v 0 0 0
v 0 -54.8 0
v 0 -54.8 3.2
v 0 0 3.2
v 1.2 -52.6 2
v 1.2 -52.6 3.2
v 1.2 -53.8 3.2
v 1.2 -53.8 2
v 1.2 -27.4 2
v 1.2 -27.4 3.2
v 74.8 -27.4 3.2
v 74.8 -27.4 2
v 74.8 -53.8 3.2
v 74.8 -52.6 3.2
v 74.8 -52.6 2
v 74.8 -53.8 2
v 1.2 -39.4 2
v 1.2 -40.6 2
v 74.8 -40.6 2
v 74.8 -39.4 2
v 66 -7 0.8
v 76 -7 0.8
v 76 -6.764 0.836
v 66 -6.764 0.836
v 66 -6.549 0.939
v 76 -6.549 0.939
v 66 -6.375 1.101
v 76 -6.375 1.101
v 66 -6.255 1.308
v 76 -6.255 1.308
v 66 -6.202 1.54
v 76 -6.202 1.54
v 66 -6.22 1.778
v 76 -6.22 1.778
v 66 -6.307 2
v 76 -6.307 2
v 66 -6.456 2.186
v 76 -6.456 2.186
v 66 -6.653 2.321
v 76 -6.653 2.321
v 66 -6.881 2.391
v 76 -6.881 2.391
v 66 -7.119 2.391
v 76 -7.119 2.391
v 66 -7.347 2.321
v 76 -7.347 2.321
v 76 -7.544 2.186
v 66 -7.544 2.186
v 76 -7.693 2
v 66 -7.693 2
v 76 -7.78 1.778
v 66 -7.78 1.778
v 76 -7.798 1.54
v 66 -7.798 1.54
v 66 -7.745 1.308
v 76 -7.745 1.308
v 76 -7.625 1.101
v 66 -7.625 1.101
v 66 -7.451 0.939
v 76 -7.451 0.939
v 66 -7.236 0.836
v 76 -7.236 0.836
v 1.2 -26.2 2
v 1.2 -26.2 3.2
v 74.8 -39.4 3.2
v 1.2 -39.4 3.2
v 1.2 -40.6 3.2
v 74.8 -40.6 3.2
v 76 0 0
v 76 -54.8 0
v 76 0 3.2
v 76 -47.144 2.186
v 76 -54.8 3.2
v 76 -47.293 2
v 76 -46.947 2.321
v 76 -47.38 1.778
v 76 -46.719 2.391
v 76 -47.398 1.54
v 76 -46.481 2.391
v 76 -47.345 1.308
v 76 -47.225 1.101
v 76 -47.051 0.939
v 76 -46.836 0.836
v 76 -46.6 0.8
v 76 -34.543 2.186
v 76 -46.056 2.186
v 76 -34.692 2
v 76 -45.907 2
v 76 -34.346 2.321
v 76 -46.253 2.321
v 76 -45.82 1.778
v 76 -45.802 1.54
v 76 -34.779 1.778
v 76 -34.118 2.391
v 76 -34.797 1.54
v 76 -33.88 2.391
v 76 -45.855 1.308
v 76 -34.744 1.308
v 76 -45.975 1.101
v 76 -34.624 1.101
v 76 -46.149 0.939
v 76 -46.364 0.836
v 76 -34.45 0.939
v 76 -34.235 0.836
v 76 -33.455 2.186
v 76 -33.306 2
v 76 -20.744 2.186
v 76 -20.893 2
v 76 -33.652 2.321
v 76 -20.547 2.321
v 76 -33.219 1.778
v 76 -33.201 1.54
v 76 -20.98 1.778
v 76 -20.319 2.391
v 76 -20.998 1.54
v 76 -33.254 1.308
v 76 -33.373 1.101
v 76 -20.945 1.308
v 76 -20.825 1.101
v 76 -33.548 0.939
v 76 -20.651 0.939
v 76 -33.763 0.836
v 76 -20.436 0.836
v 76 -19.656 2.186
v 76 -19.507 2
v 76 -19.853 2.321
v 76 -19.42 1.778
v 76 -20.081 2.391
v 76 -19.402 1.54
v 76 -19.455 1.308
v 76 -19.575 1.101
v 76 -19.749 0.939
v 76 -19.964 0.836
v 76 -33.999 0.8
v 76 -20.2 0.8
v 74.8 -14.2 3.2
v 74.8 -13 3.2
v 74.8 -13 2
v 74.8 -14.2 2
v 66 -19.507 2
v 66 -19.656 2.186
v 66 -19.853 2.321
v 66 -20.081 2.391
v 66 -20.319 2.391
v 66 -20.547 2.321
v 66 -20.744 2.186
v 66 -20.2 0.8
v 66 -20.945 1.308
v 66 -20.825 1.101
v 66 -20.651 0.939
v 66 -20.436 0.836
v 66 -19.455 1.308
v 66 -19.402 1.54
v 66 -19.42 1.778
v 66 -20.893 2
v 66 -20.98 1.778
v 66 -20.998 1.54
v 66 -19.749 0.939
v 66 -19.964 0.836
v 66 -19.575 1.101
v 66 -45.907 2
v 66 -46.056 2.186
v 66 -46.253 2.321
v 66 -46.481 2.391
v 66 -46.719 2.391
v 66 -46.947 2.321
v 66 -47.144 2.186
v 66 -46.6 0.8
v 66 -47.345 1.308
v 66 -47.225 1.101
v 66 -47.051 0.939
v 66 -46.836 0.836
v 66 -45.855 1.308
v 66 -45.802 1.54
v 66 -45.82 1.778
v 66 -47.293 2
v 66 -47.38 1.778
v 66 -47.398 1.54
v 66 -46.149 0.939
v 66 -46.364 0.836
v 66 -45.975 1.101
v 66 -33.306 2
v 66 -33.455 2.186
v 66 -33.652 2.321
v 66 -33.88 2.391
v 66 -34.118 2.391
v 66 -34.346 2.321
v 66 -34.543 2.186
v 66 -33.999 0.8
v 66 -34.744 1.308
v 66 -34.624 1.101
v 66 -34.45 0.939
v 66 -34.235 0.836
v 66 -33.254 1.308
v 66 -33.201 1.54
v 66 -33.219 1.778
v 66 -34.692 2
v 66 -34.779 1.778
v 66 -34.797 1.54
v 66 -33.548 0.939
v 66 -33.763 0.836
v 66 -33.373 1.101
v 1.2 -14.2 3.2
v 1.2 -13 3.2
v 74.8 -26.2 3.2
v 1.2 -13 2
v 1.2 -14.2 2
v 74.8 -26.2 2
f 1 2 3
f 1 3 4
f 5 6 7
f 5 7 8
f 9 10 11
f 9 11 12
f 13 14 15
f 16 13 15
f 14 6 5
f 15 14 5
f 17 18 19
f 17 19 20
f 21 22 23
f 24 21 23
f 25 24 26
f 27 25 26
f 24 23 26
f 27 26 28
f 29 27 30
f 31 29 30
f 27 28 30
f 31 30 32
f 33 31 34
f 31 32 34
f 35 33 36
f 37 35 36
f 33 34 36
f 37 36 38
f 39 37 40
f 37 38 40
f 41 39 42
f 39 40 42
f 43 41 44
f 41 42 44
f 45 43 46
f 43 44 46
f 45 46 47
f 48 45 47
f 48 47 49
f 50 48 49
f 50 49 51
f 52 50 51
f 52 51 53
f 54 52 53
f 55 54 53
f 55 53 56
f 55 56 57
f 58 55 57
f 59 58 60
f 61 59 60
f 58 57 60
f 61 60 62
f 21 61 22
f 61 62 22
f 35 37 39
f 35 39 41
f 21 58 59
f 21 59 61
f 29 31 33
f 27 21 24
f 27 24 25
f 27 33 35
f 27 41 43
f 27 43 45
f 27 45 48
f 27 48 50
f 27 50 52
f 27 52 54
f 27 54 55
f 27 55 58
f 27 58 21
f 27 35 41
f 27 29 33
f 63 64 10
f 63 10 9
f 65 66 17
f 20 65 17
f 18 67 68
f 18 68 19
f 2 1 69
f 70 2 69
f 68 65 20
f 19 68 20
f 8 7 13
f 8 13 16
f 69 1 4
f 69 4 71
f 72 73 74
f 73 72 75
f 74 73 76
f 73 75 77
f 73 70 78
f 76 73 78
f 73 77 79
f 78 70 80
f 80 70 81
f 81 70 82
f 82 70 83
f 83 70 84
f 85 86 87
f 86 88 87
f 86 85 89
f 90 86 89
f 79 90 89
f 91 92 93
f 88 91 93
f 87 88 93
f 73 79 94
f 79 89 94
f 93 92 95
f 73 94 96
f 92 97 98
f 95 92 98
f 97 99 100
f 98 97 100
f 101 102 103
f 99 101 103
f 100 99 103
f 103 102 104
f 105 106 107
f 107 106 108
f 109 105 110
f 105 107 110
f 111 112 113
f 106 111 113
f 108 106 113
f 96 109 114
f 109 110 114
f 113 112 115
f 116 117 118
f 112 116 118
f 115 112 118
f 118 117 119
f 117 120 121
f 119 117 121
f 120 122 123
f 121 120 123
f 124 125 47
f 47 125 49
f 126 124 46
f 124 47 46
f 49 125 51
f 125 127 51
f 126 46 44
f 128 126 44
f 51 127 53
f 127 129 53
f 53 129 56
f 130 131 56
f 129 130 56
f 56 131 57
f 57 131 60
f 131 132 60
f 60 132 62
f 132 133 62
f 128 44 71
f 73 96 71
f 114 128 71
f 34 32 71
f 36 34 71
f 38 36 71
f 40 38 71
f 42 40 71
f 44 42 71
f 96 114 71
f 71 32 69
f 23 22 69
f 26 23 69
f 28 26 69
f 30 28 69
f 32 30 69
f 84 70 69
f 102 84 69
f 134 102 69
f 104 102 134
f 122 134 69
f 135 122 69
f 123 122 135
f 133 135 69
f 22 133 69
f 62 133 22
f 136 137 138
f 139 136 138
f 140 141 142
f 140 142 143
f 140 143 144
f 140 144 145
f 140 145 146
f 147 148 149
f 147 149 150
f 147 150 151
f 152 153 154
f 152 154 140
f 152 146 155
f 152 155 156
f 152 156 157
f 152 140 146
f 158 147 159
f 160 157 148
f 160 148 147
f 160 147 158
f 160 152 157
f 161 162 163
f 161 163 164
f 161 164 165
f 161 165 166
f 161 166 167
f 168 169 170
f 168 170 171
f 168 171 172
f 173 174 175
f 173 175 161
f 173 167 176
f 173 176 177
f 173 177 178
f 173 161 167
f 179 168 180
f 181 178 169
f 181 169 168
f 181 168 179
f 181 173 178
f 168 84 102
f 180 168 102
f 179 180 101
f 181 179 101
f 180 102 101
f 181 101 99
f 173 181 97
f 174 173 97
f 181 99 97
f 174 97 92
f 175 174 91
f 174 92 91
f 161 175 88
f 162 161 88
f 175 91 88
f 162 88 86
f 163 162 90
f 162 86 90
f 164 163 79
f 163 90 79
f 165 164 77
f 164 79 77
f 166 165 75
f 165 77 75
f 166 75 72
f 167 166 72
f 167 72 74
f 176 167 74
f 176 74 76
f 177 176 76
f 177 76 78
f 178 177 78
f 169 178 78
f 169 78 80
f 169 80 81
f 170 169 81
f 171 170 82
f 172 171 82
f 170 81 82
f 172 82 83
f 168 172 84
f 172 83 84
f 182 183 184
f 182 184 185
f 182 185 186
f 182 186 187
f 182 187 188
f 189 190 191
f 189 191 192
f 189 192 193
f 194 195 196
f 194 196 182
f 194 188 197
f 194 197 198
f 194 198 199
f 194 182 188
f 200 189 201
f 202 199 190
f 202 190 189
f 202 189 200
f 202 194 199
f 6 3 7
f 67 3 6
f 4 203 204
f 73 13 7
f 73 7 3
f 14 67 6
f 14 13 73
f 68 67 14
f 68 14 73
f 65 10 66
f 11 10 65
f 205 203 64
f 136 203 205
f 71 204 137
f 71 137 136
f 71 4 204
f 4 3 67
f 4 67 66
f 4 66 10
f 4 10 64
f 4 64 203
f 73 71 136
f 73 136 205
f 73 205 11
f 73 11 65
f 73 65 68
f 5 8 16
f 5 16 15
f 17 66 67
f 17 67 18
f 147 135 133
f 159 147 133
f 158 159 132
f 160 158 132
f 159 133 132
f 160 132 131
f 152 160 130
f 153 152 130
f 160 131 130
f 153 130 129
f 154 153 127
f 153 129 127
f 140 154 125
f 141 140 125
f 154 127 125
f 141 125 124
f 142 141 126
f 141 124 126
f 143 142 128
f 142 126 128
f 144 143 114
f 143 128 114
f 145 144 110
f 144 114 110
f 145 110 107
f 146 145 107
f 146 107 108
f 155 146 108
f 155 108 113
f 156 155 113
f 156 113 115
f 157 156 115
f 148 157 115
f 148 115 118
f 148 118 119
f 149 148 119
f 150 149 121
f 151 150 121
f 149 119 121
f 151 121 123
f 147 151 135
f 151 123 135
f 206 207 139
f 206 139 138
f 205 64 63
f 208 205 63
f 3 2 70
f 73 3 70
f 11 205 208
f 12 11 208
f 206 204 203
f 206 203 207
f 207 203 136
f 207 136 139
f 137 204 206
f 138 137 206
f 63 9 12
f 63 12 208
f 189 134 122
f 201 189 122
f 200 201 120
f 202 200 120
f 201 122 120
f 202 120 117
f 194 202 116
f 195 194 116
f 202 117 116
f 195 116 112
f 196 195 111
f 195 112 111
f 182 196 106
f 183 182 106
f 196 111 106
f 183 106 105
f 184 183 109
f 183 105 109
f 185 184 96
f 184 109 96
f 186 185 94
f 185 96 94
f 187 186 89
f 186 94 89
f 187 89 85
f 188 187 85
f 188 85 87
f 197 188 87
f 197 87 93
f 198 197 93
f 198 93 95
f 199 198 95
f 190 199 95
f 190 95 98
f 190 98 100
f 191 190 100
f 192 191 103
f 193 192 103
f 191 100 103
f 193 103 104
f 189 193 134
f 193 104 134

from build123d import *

# Parameters (mm, degrees)
SKETCH1_W           = 76
SKETCH1_H           = 54.8
BOSS_EXTRUDE1_DEPTH = 3.2
CUT_EXTRUDE1_START  = 1.2
SKETCH2_W           = 1.2
SKETCH2_H           = 1.2
CUT_EXTRUDE1_DEPTH  = 73.6
CUT_EXTRUDE2_START  = 76
SKETCH3_R           = 0.8
CUT_EXTRUDE2_DEPTH  = 10


with BuildPart() as part:
    # Sketch1 → Boss-Extrude1 (new body)
    with BuildSketch(Plane.XY):
        with Locations((38, -27.4)):
            Rectangle(SKETCH1_W, SKETCH1_H)
    extrude(amount=BOSS_EXTRUDE1_DEPTH)

    # Sketch2 → Cut-Extrude1 (cut)
    with BuildSketch(Plane(origin=(0, 0, 0), x_dir=(0, 0, -1), z_dir=(1, 0, 0)).offset(CUT_EXTRUDE1_START)):
        with Locations((-2.6, -13.6)):
            Rectangle(SKETCH2_W, SKETCH2_H)
        with Locations((-2.6, -26.8)):
            Rectangle(SKETCH2_W, SKETCH2_H)
        with Locations((-2.6, -40)):
            Rectangle(SKETCH2_W, SKETCH2_H)
        with Locations((-2.6, -53.2)):
            Rectangle(SKETCH2_W, SKETCH2_H)
    extrude(amount=CUT_EXTRUDE1_DEPTH, mode=Mode.SUBTRACT)

    # Sketch3 → Cut-Extrude2 (cut)
    with BuildSketch(Plane(origin=(0, 0, 0), x_dir=(0, 0, -1), z_dir=(1, 0, 0)).offset(CUT_EXTRUDE2_START)):
        with Locations((-1.6, -7)):
            Circle(SKETCH3_R)
        with Locations((-1.6, -20.2)):
            Circle(SKETCH3_R)
        with Locations((-1.6, -33.998867877)):
            Circle(SKETCH3_R)
        with Locations((-1.6, -46.6)):
            Circle(SKETCH3_R)
    extrude(amount=-CUT_EXTRUDE2_DEPTH, mode=Mode.SUBTRACT)


solid = part.part
